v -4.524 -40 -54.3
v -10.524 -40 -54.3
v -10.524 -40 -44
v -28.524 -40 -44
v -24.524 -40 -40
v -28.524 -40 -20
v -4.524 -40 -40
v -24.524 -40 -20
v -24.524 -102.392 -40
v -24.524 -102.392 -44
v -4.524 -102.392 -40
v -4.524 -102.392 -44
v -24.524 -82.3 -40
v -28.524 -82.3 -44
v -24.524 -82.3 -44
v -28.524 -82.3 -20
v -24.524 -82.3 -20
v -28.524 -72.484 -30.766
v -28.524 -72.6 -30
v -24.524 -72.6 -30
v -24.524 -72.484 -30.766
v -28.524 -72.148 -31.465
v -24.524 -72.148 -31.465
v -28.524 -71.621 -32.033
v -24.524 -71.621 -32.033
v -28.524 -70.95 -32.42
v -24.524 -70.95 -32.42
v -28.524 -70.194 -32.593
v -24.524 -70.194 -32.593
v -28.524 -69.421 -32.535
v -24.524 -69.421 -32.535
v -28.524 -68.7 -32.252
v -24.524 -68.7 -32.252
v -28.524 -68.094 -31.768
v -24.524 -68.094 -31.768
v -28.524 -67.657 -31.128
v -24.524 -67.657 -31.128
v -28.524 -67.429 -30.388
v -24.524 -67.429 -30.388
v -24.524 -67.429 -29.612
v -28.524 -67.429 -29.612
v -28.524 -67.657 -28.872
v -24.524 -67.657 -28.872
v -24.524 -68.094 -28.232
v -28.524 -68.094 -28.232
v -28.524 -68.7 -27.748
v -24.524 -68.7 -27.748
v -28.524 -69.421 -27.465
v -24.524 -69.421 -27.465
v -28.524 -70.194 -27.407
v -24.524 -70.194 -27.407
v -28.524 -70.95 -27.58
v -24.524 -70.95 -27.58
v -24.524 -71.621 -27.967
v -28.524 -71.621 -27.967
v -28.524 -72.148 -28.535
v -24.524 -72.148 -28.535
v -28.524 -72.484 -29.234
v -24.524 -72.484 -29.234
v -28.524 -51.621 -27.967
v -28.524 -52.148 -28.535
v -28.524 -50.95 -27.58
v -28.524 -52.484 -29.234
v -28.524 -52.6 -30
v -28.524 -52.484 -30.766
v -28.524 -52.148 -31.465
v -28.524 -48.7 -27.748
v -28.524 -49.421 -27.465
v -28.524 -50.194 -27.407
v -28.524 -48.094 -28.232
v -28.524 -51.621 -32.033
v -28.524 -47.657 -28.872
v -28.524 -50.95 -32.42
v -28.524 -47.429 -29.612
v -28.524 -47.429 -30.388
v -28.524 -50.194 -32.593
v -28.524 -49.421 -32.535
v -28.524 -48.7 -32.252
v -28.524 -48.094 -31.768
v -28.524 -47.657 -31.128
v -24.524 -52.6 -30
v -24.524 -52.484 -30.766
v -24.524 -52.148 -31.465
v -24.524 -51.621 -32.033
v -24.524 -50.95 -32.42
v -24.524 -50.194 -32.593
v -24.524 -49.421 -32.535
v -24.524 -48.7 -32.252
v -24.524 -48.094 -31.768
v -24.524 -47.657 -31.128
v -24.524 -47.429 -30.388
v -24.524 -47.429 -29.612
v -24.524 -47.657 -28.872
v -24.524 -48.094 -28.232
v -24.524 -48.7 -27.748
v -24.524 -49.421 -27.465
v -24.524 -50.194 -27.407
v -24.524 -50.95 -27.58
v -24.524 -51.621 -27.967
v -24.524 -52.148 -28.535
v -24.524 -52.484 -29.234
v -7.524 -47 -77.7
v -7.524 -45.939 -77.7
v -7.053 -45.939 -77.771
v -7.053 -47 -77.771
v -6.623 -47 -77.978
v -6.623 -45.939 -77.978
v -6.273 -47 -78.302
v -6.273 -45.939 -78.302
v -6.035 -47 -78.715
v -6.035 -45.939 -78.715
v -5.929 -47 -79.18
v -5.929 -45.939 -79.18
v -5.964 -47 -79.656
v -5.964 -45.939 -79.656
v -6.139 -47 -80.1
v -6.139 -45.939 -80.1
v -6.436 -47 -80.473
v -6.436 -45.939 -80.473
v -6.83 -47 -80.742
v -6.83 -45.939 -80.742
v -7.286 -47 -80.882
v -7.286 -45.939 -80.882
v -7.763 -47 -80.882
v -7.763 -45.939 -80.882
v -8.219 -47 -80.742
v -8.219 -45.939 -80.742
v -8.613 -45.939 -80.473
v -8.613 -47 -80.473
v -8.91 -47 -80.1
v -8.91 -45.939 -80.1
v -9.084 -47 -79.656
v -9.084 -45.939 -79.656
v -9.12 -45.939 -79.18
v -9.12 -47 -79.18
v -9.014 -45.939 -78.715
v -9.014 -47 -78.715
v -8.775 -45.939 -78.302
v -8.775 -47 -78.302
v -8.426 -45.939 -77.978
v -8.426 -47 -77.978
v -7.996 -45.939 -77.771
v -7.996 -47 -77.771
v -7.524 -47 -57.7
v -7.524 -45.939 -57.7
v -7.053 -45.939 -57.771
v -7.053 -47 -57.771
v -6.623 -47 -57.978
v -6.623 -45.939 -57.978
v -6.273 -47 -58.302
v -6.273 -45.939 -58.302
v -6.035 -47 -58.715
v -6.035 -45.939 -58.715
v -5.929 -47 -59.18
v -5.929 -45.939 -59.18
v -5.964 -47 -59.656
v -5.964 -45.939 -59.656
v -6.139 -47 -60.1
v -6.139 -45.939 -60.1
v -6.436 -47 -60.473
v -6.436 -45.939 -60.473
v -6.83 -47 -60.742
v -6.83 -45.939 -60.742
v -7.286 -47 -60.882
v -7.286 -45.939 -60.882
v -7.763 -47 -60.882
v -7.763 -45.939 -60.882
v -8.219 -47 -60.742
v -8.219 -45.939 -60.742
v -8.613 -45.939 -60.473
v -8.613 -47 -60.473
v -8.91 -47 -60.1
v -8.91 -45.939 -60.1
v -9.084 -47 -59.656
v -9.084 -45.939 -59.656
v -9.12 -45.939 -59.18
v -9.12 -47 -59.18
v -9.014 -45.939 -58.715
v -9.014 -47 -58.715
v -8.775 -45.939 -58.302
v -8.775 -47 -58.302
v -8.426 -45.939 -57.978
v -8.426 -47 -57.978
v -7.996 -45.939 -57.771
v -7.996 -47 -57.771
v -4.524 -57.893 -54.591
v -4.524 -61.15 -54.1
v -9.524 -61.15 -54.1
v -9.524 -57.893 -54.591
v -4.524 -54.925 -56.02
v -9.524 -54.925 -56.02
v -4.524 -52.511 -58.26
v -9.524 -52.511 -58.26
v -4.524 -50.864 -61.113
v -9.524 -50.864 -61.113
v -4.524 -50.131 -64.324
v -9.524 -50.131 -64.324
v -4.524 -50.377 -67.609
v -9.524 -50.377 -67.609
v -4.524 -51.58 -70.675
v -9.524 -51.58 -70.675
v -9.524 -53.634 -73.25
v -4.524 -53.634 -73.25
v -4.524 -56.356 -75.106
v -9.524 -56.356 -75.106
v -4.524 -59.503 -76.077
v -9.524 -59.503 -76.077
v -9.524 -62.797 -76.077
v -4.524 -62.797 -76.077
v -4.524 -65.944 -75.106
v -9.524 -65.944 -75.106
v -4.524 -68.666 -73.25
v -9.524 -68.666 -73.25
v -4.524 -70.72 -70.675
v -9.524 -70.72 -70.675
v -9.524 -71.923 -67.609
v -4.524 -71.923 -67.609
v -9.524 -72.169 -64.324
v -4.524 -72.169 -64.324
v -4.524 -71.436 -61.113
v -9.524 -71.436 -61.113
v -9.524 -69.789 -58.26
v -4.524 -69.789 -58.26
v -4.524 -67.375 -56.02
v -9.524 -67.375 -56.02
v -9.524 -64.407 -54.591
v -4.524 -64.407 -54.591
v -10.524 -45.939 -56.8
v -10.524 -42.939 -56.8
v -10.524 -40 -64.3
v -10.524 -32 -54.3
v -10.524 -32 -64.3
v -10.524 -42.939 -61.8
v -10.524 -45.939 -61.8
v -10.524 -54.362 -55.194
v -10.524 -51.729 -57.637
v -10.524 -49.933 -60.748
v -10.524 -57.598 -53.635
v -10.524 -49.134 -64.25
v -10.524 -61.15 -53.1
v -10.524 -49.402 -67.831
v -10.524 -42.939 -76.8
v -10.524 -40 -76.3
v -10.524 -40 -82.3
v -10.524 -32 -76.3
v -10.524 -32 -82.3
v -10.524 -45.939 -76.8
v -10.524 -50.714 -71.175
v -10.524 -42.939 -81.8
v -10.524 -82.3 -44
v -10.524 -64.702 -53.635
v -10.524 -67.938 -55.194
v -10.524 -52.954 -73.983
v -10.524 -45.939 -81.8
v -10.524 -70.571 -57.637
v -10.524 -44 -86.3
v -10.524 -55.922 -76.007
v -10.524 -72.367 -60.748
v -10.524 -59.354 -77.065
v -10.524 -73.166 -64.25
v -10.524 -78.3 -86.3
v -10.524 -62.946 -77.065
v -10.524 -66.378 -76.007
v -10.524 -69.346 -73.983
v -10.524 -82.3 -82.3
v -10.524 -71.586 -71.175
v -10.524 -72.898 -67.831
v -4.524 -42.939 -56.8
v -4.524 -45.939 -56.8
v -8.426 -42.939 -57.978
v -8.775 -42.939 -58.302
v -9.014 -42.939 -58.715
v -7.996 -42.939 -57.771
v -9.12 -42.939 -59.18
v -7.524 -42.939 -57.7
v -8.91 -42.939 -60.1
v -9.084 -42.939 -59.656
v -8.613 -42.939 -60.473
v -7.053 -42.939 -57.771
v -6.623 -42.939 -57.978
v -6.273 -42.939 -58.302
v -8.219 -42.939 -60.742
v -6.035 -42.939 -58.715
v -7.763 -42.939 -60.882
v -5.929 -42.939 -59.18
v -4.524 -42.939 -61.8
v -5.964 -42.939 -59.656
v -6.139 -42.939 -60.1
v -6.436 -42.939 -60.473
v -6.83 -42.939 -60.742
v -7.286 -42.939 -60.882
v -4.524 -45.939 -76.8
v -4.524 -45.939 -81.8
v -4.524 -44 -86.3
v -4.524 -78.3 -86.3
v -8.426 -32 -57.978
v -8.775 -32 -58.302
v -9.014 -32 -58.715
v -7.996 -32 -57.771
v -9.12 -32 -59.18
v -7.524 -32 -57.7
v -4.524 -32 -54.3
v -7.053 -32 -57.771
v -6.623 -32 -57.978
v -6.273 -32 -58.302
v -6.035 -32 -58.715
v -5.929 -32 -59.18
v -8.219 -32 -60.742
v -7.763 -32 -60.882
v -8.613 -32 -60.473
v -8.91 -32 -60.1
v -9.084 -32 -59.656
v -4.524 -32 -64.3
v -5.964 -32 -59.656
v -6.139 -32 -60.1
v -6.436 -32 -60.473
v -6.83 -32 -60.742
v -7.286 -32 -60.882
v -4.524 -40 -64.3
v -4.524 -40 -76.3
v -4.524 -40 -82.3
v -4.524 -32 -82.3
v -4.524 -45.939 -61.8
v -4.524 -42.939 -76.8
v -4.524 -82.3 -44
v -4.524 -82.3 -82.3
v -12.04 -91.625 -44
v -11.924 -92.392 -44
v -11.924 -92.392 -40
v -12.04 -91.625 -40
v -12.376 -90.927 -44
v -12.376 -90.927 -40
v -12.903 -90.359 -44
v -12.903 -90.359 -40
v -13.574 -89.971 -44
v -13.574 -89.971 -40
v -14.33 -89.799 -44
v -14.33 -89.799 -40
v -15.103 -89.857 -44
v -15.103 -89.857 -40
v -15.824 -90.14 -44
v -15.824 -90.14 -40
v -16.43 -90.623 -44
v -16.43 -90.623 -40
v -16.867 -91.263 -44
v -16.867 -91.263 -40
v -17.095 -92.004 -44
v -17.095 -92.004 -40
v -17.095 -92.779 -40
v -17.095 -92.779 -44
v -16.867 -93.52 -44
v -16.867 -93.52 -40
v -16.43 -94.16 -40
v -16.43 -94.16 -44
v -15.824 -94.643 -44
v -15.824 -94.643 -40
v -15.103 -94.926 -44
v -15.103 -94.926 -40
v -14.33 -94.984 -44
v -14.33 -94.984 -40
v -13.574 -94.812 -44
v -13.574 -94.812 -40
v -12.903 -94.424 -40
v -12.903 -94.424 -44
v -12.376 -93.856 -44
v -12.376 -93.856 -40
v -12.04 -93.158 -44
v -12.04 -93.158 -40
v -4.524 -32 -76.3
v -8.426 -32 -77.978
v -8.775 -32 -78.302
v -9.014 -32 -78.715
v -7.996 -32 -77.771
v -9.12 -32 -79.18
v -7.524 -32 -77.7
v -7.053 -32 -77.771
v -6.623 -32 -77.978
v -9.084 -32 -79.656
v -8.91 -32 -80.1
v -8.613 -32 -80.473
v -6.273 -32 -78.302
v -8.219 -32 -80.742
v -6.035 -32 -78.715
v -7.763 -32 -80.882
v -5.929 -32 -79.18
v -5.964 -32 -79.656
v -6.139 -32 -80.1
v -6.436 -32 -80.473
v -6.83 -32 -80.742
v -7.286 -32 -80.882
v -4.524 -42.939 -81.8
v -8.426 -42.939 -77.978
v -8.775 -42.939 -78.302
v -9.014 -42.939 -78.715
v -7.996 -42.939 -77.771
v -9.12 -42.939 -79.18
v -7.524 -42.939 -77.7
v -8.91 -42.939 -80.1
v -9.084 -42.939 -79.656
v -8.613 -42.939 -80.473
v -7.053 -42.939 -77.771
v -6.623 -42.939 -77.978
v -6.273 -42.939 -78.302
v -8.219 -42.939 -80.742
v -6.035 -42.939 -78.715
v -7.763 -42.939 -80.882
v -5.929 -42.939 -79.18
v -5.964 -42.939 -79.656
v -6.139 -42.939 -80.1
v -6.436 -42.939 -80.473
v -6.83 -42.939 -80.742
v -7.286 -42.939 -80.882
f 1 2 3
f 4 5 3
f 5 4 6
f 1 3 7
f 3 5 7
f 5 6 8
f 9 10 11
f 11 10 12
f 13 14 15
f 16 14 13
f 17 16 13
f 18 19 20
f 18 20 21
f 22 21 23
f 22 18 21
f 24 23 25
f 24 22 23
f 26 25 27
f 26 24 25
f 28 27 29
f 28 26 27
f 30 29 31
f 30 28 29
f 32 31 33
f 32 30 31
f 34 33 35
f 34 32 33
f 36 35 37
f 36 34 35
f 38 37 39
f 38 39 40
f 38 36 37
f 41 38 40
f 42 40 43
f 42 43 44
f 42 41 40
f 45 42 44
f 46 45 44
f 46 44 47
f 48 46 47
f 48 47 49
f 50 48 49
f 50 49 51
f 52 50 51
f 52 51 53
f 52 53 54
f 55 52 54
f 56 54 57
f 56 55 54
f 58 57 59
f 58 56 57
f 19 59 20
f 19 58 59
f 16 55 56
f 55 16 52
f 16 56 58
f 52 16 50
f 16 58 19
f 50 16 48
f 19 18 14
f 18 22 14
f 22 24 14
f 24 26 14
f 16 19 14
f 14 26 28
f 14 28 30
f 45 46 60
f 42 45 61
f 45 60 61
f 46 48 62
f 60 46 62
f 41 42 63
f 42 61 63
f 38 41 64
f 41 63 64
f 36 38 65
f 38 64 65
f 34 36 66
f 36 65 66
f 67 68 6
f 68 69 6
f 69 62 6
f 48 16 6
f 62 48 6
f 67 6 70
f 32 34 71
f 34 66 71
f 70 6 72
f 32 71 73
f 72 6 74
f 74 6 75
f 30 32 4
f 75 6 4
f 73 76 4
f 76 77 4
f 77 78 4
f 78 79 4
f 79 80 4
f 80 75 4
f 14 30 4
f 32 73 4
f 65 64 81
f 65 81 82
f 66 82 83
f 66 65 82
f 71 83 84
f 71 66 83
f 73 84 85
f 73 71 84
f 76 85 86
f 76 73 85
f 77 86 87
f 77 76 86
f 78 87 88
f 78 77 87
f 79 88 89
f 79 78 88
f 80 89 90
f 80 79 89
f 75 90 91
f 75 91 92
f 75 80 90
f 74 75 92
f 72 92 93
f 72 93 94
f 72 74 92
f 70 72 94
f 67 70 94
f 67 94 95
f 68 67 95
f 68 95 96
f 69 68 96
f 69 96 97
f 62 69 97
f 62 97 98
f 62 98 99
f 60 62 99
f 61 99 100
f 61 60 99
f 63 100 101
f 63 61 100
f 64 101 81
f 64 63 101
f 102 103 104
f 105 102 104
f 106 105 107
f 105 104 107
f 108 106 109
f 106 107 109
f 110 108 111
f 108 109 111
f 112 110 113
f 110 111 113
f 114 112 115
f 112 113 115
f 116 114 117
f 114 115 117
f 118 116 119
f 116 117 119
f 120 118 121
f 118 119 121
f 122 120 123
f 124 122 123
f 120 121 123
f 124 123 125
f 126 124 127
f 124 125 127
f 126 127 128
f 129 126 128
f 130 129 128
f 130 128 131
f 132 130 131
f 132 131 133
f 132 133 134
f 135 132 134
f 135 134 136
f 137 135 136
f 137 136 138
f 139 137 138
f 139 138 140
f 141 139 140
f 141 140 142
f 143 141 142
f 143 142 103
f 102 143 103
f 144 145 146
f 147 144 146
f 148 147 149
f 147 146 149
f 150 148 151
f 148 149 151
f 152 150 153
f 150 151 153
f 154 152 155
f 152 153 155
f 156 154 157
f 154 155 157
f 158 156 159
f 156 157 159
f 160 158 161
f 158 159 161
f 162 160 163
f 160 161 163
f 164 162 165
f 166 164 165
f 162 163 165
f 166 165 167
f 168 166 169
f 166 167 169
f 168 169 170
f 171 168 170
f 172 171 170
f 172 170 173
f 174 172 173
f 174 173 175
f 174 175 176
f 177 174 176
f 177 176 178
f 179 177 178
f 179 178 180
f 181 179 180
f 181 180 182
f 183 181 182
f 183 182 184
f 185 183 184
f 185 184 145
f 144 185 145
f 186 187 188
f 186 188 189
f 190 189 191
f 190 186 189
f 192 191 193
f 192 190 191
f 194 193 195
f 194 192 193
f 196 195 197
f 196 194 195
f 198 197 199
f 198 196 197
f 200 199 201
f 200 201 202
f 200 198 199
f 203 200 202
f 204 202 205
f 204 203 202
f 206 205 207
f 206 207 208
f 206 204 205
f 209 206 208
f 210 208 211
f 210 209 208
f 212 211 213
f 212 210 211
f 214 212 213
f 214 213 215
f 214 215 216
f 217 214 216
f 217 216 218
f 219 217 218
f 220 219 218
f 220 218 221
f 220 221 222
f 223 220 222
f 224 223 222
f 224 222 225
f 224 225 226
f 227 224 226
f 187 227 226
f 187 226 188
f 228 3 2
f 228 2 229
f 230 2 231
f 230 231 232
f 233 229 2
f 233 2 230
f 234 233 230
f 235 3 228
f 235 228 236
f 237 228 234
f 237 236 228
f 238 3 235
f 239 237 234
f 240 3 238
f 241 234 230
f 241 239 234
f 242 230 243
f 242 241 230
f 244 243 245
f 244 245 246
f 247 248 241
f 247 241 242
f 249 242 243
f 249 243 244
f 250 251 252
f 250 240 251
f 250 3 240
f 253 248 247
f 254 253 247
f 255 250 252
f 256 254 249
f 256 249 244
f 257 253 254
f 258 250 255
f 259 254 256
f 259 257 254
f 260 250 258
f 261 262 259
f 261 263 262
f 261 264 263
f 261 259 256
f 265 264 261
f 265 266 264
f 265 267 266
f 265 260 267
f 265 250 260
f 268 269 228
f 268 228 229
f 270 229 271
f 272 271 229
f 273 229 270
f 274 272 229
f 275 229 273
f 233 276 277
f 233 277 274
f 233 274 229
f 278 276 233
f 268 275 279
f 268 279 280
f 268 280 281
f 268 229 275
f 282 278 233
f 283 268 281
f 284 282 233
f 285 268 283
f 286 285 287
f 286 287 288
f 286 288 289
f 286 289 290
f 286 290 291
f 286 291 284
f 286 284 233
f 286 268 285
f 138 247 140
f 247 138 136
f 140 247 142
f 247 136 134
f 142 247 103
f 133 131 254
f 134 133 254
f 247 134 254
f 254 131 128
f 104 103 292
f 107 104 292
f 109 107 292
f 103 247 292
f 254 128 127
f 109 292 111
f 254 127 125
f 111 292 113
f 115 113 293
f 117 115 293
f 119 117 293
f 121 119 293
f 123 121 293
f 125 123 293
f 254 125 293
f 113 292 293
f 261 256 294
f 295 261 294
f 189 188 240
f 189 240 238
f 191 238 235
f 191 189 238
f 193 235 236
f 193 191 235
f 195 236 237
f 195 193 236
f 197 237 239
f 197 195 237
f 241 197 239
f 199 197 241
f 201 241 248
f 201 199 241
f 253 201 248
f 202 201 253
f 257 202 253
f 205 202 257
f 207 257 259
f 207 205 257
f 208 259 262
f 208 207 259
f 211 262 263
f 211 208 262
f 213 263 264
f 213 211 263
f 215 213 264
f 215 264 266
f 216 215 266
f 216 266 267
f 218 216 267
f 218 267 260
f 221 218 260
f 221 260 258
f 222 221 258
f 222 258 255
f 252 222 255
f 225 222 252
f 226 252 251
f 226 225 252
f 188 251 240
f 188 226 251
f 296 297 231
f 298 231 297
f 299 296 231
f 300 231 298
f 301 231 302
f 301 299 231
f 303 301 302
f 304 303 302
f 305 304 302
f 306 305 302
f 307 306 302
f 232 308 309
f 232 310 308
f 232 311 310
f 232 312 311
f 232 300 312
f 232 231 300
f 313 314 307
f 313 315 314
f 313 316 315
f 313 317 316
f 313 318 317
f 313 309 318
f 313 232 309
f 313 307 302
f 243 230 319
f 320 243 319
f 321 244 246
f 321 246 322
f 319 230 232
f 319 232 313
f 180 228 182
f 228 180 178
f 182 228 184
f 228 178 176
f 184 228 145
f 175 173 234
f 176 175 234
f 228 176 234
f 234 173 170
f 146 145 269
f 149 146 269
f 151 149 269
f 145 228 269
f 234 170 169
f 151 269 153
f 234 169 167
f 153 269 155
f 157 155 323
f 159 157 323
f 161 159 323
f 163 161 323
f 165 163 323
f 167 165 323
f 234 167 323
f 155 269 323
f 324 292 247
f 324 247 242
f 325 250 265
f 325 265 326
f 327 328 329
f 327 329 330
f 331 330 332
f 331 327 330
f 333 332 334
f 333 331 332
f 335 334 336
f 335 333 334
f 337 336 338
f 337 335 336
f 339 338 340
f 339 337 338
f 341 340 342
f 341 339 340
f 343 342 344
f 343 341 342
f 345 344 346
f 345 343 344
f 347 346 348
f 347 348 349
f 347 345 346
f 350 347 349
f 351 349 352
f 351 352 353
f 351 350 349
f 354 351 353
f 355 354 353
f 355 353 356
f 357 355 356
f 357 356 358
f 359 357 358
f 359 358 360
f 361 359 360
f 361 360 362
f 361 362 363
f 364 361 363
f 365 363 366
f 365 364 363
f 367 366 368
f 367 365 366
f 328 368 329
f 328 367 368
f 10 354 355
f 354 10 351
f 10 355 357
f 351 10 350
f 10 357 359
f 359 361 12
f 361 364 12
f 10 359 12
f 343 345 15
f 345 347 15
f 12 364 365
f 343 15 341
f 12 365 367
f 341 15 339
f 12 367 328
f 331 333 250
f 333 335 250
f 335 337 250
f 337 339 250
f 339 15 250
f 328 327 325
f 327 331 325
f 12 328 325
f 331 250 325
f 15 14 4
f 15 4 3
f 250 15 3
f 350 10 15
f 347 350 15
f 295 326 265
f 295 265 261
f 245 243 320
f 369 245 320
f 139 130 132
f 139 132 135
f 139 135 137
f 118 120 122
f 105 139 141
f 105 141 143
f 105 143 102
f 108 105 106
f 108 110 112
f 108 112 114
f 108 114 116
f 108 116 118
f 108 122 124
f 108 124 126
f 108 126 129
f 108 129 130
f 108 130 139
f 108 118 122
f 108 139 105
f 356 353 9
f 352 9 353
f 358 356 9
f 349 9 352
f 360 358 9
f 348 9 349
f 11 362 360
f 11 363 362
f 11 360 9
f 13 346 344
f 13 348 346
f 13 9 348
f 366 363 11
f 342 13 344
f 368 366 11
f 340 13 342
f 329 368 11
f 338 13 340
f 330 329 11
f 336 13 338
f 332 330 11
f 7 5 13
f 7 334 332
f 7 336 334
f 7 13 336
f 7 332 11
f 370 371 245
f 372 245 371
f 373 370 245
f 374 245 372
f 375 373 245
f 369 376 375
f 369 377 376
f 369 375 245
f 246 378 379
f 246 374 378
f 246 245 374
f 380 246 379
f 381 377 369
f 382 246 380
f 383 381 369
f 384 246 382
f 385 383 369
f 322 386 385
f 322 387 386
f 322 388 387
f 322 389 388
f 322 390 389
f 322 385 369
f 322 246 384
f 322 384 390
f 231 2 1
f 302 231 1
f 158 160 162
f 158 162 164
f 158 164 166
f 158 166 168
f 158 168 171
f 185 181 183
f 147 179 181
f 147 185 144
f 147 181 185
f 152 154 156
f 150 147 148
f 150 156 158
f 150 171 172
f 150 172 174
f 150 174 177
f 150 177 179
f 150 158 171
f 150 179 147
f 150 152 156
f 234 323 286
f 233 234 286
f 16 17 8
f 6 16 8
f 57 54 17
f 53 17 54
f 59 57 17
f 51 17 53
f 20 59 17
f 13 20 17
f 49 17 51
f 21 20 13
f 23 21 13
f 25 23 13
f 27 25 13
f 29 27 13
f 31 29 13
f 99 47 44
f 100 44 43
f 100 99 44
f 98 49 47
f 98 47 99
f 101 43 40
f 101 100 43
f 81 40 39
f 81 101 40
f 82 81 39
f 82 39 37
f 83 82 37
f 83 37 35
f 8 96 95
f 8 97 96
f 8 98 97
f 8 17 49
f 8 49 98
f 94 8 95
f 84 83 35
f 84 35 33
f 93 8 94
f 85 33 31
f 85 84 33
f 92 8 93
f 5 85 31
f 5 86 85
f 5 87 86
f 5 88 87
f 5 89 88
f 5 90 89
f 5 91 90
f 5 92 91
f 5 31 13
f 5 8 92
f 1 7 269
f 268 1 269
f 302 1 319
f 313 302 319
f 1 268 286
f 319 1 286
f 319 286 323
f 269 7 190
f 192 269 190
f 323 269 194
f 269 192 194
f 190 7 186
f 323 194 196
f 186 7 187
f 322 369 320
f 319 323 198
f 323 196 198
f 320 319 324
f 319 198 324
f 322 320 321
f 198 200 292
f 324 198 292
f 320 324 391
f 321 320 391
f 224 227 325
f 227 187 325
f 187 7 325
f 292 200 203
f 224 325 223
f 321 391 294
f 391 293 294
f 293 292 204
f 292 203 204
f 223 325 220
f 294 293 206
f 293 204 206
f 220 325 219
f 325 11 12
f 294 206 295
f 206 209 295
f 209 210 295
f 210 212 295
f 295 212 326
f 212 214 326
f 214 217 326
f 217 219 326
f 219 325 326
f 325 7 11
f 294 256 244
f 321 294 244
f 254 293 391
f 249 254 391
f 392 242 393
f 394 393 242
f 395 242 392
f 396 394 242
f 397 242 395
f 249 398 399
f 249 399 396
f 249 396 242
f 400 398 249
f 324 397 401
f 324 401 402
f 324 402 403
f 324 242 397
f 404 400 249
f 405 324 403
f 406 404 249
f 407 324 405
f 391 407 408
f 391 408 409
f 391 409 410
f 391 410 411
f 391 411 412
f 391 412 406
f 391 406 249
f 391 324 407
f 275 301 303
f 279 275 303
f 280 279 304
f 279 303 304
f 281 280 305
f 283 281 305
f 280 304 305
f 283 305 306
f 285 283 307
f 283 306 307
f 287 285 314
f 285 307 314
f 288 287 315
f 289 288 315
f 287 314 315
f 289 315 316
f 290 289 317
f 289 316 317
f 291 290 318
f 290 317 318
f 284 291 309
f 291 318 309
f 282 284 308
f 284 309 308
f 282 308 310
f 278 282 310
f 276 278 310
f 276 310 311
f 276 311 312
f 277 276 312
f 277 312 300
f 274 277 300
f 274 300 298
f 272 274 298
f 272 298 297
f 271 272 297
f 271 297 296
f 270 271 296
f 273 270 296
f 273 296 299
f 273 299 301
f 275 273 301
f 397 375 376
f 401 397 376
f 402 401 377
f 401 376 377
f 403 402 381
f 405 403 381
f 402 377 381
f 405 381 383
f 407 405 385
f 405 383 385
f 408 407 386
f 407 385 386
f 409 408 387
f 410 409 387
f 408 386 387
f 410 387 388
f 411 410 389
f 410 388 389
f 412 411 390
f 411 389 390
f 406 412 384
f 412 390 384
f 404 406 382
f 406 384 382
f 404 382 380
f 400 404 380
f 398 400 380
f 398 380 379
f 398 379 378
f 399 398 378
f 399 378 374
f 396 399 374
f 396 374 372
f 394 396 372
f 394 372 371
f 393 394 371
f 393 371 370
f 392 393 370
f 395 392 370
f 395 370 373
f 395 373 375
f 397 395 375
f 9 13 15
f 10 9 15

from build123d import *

# Parameters (mm, degrees)
SKICA2_W                 = 20
SKICA2_H                 = 42.3
P_IDAT_VYSUNUT_M1_DEPTH  = 4
SKICA3_W                 = 24
SKICA3_H                 = 42.3
P_IDAT_VYSUNUT_M2_DEPTH  = 4
SKICA4_W                 = 6
SKICA4_H                 = 42.3
P_IDAT_VYSUNUT_M3_DEPTH  = 42.3
SKICA5_R                 = 11.05
ODEBRAT_VYSUNUT_M1_DEPTH = 7
SKICA7_R                 = 2.6
ODEBRAT_VYSUNUT_M3_DEPTH = 4
ZKOSEN_1_SIZE            = 1
SKICA8_W                 = 20
SKICA8_H                 = 4
P_IDAT_VYSUNUT_M4_DEPTH  = 20.091596743
SKICA9_R                 = 2.6
ODEBRAT_VYSUNUT_M4_DEPTH = 4
ODEBRAT_VYSUNUT_M5_DEPTH = 80
SKICA11_W                = 84.692176523
SKICA11_H                = 80.474242756
ODEBRAT_VYSUNUT_M6_DEPTH = 24
SKICA12_W                = 6
SKICA12_H                = 6
SKICA12_H_2              = 10
P_IDAT_VYSUNUT_M5_DEPTH  = 8
SKICA13_R                = 1.6
ODEBRAT_VYSUNUT_M7_DEPTH = 15
SKICA14_W                = 5
SKICA14_H                = 3
ODEBRAT_VYSUNUT_M8_DEPTH = 15


with BuildPart() as part:
    # Skica2 → Přidat vysunutím1 (new body)
    with BuildSketch(Plane.XY):
        with Locations((-14.524287798, -61.15)):
            Rectangle(SKICA2_W, SKICA2_H)
    extrude(amount=P_IDAT_VYSUNUT_M1_DEPTH)

    # Skica3 → Přidat vysunutím2 (add)
    with BuildSketch(Plane.ZY.offset(24.524287798)):
        with Locations((-8, -61.15)):
            Rectangle(SKICA3_W, SKICA3_H)
    extrude(amount=P_IDAT_VYSUNUT_M2_DEPTH)

    # Skica4 → Přidat vysunutím3 (add)
    with BuildSketch(Plane.XY.offset(4)):
        with Locations((-7.524287798, -61.15)):
            Rectangle(SKICA4_W, SKICA4_H)
    extrude(amount=P_IDAT_VYSUNUT_M3_DEPTH)

    # Skica5 → Odebrat vysunutím1 (cut)
    with BuildSketch(Plane(origin=(-4.524287798, 0, 0), x_dir=(0, 0, -1), z_dir=(1, 0, 0))):
        with Locations((-25.15, -61.15)):
            Circle(SKICA5_R)
    extrude(amount=-ODEBRAT_VYSUNUT_M1_DEPTH, mode=Mode.SUBTRACT)

    # Skica7 → Odebrat vysunutím3 (cut)
    with BuildSketch(Plane.ZY.offset(28.524287798)):
        with Locations(Location((-10, -50, 0), (0, 0, 270))):
            Circle(SKICA7_R)
        with Locations(Location((-10, -70, 0), (0, 0, 270))):
            Circle(SKICA7_R)
    extrude(amount=-ODEBRAT_VYSUNUT_M3_DEPTH, mode=Mode.SUBTRACT)

    # Zkosení1
    zkosen_1_edges = [part.edges().sort_by_distance(p)[0] for p in [
        (-10.524287798, -61.15, 36.2),
    ]]
    chamfer(zkosen_1_edges, length=ZKOSEN_1_SIZE)

    # Skica8 → Přidat vysunutím4 (add)
    with BuildSketch(Plane.XZ.offset(82.3)):
        with Locations((-14.524287798, 2)):
            Rectangle(SKICA8_W, SKICA8_H)
    extrude(amount=P_IDAT_VYSUNUT_M4_DEPTH)

    # Skica9 → Odebrat vysunutím4 (cut)
    with BuildSketch(Plane.XY.offset(4)):
        with Locations((-14.524287798, -92.391596743)):
            Circle(SKICA9_R)
    extrude(amount=-ODEBRAT_VYSUNUT_M4_DEPTH, mode=Mode.SUBTRACT)

    # Skica10 → Odebrat vysunutím5 (cut)
    with BuildSketch(Plane.ZY.offset(10.524287798)):
        Polygon((46.3, -44), (42.3, -40), (46.565878614, -39.259270079), align=None)
        Polygon((42.3, -82.3), (46.3, -78.3), (47.745576453, -80.3), (46.3, -85.415433185), align=None)
    extrude(amount=-ODEBRAT_VYSUNUT_M5_DEPTH, mode=Mode.SUBTRACT)


with BuildPart() as body_2:
    # Zrcadlit1: mirrored copy
    add(part.part.mirror(Plane(origin=(-28.524287798, -40, -20), x_dir=(1, 0, 0), z_dir=(0, 0, 1))))

    # Skica12 → Přidat vysunutím5 (add)
    with BuildSketch(Plane(origin=(0, -40, 0), x_dir=(1, 0, 0), z_dir=(0, 1, 0))):
        with Locations((-7.524287798, 79.3)):
            Rectangle(SKICA12_W, SKICA12_H)
        with Locations((-7.524287798, 59.3)):
            Rectangle(SKICA12_W, SKICA12_H_2)
    extrude(amount=P_IDAT_VYSUNUT_M5_DEPTH)

    # Skica13 → Odebrat vysunutím7 (cut)
    with BuildSketch(Plane(origin=(0, -32, 0), x_dir=(1, 0, 0), z_dir=(0, 1, 0))):
        with Locations(Location((-7.524287798, 59.3, 0), (0, 0, 270))):
            Circle(SKICA13_R)
        with Locations(Location((-7.524287798, 79.3, 0), (0, 0, 270))):
            Circle(SKICA13_R)
    extrude(amount=-ODEBRAT_VYSUNUT_M7_DEPTH, mode=Mode.SUBTRACT)

    # Skica14 → Odebrat vysunutím8 (cut)
    with BuildSketch(Plane(origin=(-4.524287798, 0, 0), x_dir=(0, 0, -1), z_dir=(1, 0, 0))):
        with Locations((59.3, -44.438988808)):
            Rectangle(SKICA14_W, SKICA14_H)
        with Locations((79.3, -44.438988808)):
            Rectangle(SKICA14_W, SKICA14_H)
    extrude(amount=-ODEBRAT_VYSUNUT_M8_DEPTH, mode=Mode.SUBTRACT)


with BuildPart() as part_1:
    add(part.part)

    # Skica11 → Odebrat vysunutím6 (cut)
    with BuildSketch(Plane.ZY.offset(28.524287798)):
        with Locations((22.346088262, -80.237121378)):
            Rectangle(SKICA11_W, SKICA11_H)
    extrude(amount=-ODEBRAT_VYSUNUT_M6_DEPTH, mode=Mode.SUBTRACT)


solid = body_2.part
